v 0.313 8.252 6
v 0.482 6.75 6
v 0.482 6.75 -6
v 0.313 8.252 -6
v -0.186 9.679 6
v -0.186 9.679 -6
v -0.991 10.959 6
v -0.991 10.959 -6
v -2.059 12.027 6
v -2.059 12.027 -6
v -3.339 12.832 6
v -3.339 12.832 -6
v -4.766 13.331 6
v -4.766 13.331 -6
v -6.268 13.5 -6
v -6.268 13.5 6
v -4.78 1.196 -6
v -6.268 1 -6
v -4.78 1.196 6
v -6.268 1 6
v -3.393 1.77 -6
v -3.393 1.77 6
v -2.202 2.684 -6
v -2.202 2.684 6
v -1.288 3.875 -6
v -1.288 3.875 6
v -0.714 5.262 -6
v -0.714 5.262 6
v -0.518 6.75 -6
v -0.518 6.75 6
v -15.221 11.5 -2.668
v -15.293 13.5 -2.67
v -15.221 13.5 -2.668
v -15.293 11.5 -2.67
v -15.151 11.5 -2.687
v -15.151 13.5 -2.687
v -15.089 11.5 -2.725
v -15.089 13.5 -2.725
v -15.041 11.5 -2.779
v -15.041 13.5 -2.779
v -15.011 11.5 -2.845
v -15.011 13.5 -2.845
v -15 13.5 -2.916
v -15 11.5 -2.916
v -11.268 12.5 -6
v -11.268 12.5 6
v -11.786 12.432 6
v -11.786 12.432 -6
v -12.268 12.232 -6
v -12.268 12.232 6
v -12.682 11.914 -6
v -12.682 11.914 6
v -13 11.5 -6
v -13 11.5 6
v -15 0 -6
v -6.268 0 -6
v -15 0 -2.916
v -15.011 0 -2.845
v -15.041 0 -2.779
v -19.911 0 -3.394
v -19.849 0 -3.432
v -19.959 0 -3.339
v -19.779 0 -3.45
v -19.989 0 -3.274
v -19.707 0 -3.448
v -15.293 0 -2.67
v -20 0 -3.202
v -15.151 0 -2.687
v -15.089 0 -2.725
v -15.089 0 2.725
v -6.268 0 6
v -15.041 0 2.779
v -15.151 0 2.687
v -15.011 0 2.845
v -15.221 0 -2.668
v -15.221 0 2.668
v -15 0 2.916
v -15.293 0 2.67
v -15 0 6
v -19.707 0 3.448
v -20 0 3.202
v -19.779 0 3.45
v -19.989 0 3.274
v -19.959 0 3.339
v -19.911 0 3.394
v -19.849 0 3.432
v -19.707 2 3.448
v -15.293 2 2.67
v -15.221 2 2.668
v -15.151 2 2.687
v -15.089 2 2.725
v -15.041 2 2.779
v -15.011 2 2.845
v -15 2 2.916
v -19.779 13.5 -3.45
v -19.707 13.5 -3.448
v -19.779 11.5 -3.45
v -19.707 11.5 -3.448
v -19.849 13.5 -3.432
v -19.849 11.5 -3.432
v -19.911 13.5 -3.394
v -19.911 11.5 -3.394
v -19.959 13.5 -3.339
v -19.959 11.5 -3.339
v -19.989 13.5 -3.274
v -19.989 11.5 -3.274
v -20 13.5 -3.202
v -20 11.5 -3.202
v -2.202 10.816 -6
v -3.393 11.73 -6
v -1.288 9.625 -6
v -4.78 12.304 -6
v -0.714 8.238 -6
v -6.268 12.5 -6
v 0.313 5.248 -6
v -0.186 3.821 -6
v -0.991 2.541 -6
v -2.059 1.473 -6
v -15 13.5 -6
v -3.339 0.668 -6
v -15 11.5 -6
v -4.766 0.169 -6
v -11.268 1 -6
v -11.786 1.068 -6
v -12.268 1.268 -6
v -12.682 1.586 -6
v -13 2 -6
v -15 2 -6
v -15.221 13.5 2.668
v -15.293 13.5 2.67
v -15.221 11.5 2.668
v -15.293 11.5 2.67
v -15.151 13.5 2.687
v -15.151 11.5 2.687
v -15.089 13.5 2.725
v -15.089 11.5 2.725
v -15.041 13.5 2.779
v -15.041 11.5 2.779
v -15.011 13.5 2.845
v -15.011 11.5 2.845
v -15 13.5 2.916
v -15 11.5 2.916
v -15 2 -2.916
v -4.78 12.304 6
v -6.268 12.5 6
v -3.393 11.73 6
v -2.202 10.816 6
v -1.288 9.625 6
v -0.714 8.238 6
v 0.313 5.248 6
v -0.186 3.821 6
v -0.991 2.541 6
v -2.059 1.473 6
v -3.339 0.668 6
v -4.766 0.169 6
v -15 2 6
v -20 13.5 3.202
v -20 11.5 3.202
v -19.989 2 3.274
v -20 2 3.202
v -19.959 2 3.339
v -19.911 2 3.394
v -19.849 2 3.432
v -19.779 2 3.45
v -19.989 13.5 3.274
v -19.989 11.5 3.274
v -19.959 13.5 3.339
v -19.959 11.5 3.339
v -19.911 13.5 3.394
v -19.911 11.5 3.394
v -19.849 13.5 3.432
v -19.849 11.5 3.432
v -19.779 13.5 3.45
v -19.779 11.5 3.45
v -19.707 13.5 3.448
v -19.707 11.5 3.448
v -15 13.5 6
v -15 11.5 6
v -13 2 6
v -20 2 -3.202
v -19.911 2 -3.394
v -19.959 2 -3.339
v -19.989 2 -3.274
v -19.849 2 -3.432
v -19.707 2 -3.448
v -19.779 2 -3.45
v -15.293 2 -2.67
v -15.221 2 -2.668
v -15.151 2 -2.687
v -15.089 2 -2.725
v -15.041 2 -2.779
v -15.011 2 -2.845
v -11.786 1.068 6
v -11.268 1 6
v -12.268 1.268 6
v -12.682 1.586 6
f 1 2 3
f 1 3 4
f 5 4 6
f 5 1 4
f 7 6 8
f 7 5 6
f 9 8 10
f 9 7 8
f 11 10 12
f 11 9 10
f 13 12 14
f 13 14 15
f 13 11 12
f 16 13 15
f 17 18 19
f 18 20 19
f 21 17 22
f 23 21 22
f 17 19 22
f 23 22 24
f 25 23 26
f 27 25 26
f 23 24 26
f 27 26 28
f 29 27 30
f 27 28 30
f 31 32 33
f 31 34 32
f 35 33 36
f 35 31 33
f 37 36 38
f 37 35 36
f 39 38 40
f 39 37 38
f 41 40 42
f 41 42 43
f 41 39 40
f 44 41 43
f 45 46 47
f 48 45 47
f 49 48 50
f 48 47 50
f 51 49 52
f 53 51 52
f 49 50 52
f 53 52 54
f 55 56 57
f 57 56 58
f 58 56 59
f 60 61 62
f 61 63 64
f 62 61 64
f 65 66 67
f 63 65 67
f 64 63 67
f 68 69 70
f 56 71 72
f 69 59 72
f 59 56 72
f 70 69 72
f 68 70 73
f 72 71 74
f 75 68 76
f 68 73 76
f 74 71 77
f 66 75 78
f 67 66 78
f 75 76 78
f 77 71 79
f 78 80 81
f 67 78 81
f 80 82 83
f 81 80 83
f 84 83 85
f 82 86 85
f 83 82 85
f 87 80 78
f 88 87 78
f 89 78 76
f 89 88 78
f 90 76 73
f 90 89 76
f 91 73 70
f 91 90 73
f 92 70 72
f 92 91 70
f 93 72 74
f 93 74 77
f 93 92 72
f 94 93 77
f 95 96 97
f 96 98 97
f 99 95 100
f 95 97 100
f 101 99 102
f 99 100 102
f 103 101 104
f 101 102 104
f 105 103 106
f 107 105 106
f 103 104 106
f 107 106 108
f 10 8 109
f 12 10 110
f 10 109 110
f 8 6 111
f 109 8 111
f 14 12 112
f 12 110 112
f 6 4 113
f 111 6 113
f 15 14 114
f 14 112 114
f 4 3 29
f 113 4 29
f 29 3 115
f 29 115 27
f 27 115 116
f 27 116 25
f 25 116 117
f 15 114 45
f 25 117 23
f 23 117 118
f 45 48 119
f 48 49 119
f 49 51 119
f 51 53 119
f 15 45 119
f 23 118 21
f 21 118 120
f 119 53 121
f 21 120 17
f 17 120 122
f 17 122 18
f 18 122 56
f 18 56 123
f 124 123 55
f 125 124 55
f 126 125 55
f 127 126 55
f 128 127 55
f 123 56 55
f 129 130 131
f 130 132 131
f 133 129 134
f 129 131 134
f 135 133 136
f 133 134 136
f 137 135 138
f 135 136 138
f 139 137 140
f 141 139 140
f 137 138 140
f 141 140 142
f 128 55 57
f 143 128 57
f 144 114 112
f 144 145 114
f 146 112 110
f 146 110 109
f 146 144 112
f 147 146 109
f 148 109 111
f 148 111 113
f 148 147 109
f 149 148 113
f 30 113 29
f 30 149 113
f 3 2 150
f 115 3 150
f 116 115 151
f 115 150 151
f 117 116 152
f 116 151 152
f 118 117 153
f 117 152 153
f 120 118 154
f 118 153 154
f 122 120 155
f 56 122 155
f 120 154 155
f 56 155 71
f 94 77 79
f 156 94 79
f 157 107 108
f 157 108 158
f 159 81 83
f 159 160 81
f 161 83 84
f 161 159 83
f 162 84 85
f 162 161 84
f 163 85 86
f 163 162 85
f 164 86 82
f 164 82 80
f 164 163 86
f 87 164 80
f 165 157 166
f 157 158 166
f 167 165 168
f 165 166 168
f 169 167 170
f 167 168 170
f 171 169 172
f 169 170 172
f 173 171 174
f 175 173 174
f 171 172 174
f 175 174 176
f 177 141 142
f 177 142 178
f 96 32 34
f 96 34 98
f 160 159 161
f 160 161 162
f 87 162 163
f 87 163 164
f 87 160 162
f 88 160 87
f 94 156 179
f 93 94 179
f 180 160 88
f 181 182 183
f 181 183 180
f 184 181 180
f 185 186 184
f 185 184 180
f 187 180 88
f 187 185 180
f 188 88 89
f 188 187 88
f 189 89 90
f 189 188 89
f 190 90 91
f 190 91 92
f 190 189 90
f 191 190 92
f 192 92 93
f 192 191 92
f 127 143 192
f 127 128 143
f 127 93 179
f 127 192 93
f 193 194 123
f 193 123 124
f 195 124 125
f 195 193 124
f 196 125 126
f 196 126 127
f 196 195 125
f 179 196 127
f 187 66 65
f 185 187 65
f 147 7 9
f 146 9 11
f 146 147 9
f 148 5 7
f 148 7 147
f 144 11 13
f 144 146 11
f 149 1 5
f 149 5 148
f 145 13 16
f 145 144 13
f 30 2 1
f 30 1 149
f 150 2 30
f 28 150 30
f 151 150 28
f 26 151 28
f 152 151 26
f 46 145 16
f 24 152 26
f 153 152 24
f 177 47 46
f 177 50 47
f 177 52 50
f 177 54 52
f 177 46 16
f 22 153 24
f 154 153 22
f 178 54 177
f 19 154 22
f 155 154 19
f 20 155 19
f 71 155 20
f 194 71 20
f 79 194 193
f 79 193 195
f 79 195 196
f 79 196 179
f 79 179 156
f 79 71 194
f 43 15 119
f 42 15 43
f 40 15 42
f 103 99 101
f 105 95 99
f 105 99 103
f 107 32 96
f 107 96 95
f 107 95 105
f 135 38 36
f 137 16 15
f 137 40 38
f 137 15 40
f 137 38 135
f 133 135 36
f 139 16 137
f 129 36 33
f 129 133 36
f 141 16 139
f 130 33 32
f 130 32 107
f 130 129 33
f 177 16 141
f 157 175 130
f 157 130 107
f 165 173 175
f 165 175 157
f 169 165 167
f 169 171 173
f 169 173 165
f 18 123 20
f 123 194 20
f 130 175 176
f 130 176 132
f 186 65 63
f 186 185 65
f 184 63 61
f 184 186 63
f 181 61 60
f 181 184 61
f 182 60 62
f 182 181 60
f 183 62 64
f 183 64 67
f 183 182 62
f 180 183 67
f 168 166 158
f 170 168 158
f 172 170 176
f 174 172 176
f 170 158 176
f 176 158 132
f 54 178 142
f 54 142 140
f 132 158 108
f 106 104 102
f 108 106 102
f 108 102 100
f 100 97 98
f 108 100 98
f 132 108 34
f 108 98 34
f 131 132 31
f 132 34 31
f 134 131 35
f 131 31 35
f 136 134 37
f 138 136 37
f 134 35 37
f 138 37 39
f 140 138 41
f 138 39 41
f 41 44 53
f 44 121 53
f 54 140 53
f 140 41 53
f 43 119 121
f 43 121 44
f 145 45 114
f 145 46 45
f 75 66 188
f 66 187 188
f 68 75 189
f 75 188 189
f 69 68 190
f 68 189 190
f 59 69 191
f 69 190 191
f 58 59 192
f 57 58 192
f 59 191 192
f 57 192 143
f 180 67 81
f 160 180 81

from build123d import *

# Parameters (mm, degrees)
BOSS_EXTRUDE1_DEPTH = 2
FILLET1_R           = 0.25
SKETCH3_W           = 26
SKETCH3_H           = 12
CUT_EXTRUDE2_DEPTH  = 1
FILLET6_R           = 2
SKETCH4_W           = 36.903708965
SKETCH4_H           = 12
CUT_EXTRUDE3_DEPTH  = 5
BOSS_EXTRUDE2_DEPTH = 6


with BuildPart() as part:
    # Sketch1 → Boss-Extrude1 (new body)
    with BuildSketch(Plane(origin=(0, 0, 0), x_dir=(1, 0, 0), z_dir=(0, 1, 0))):
        Polygon((-15, 2.618365096), (-20, 3.5), (-20, -3.5), (-15, -2.618365096), (-15, -6), (15, -6), (15, -2.618365096), (20, -3.5), (20, 3.5), (15, 2.618365096), (15, 6), (-15, 6), align=None)
    extrude(amount=BOSS_EXTRUDE1_DEPTH)

    # Fillet1
    fillet1_edges = [part.edges().sort_by_distance(p)[0] for p in [
        (15, 1, -2.618365096),
        (20, 1, -3.5),
        (20, 1, 3.5),
        (15, 1, 2.618365096),
        (-15, 1, 2.618365096),
        (-20, 1, 3.5),
        (-20, 1, -3.5),
        (-15, 1, -2.618365096),
    ]]
    fillet(fillet1_edges, radius=FILLET1_R)

    # Sketch3 → Cut-Extrude2 (cut)
    with BuildSketch(Plane(origin=(0, 2, 0), x_dir=(1, 0, 0), z_dir=(0, 1, 0))):
        Rectangle(SKETCH3_W, SKETCH3_H)
    extrude(amount=-CUT_EXTRUDE2_DEPTH, mode=Mode.SUBTRACT)

    # Fillet6
    # the kernel refuses this fillet: 2 mm, written as the material it adds along each edge
    with BuildSketch(Plane(origin=(-13, 1, 6), x_dir=(0, 1, 0), z_dir=(0, 0, -1))) as fillet6_piece_1:
        with BuildLine():
            CenterArc((2, 1.732050808), FILLET6_R, 180, 60)
            Line((0, 1.732050808), (-0.04, 1.732050808))
            Line((-0.04, 1.732050808), (-0.04, 0))
            Line((-0.04, 0), (0, -0.04))
            ThreePointArc((0, -0.04), (0.5, -0.04), (0.98, -0.034641016))
            Line((0.98, -0.034641016), (1, 0))
        make_face()
    extrude(amount=12)
    with BuildSketch(Plane(origin=(13, 1, -6), x_dir=(-1, 0, 0), z_dir=(0, 0, 1))) as fillet6_piece_2:
        with BuildLine():
            CenterArc((1.732050808, -2), FILLET6_R, 90, 60)
            Line((0, -1), (-0.034641016, -0.98))
            ThreePointArc((-0.034641016, -0.98), (-0.04, -0.5), (-0.04, 0))
            Line((-0.04, 0), (0, 0.04))
            Line((0, 0.04), (1.732050808, 0.04))
            Line((1.732050808, 0.04), (1.732050808, 0))
        make_face()
    extrude(amount=12)

    # Sketch4 → Cut-Extrude3 (cut, symmetric)
    with BuildSketch(Plane(origin=(0, 1, 0), x_dir=(1, 0, 0), z_dir=(0, 1, 0))):
        with Locations((7.18390529, 0)):
            Rectangle(SKETCH4_W, SKETCH4_H)
    extrude(amount=CUT_EXTRUDE3_DEPTH, both=True, mode=Mode.SUBTRACT)

    # Sketch6 → Boss-Extrude2 (add, symmetric)
    with BuildSketch(Plane.XY):
        with BuildLine():
            Line((-11.267949192, 0), (-11.267949192, 1))
            Line((-11.267949192, 1), (-6.267949192, 1))
            ThreePointArc((-6.267949192, 1), (-2.202085201, 2.684136008), (-0.517949192, 6.75))
            Line((-0.517949192, 6.75), (0.482050808, 6.75))
            ThreePointArc((0.482050808, 6.75), (-1.494978419, 1.977029227), (-6.267949192, 0))
            Line((-6.267949192, 0), (-11.267949192, 0))
        make_face()
    extrude(amount=BOSS_EXTRUDE2_DEPTH, both=True)

    # Mirror3: part across plane


with BuildPart() as part_1:
    add(part.part)
    add(part.part.mirror(Plane.ZX.offset(6.75)))


solid = part_1.part
